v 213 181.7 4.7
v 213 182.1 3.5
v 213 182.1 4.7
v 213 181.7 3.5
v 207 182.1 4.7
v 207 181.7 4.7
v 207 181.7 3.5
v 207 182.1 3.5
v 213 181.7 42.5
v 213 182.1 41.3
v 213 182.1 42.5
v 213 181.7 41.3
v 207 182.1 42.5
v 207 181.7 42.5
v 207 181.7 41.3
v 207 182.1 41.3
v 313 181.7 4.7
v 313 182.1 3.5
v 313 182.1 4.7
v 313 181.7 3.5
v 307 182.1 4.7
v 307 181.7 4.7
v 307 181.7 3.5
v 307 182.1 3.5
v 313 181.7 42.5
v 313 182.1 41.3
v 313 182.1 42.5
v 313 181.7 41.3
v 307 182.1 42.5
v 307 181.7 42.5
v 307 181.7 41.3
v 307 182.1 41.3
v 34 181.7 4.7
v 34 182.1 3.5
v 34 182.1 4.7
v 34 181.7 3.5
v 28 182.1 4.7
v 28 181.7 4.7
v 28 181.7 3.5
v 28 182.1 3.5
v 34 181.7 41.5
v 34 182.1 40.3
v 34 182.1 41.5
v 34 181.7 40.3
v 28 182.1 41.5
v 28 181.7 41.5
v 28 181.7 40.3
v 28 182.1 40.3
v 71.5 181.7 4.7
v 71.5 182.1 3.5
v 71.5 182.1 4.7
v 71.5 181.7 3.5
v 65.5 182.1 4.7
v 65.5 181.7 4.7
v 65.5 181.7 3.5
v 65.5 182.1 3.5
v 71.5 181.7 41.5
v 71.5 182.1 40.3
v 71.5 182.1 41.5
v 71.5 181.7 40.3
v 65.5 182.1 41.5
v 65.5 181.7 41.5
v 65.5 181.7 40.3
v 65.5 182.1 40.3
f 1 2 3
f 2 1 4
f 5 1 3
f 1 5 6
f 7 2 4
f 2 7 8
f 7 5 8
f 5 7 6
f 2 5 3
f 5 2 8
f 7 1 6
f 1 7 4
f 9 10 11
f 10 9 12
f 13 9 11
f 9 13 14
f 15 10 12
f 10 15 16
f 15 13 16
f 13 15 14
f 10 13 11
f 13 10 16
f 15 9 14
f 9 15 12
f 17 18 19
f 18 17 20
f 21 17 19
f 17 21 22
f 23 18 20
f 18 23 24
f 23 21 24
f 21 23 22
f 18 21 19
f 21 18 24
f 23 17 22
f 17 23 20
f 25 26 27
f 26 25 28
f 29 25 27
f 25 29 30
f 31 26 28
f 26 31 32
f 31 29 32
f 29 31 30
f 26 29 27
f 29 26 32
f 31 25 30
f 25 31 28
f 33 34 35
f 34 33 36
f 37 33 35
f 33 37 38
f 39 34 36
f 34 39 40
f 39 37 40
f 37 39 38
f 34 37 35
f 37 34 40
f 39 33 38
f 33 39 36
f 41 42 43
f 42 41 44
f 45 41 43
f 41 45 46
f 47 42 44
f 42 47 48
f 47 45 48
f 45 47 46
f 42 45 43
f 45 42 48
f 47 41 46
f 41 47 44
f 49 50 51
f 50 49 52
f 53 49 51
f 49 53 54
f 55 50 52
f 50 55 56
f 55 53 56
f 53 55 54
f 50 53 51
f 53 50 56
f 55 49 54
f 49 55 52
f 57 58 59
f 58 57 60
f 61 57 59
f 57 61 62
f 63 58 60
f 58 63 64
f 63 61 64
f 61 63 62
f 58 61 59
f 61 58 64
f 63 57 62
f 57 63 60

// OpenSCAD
// RECEIVING PROPOSAL ONLY: custom FR4 shims, material/process unaccepted.
shims=[["NF", 210, 42.5], ["NF", 310, 42.5], ["FPC", 31, 41.5], ["FPC", 68.5, 41.5]];
module thin_edge_shims(){for(p=shims)for(z=[3.5,p[2]-1.2])
translate([p[1]-3,181.7,z])cube([6,.4,1.2]);}
thin_edge_shims();
